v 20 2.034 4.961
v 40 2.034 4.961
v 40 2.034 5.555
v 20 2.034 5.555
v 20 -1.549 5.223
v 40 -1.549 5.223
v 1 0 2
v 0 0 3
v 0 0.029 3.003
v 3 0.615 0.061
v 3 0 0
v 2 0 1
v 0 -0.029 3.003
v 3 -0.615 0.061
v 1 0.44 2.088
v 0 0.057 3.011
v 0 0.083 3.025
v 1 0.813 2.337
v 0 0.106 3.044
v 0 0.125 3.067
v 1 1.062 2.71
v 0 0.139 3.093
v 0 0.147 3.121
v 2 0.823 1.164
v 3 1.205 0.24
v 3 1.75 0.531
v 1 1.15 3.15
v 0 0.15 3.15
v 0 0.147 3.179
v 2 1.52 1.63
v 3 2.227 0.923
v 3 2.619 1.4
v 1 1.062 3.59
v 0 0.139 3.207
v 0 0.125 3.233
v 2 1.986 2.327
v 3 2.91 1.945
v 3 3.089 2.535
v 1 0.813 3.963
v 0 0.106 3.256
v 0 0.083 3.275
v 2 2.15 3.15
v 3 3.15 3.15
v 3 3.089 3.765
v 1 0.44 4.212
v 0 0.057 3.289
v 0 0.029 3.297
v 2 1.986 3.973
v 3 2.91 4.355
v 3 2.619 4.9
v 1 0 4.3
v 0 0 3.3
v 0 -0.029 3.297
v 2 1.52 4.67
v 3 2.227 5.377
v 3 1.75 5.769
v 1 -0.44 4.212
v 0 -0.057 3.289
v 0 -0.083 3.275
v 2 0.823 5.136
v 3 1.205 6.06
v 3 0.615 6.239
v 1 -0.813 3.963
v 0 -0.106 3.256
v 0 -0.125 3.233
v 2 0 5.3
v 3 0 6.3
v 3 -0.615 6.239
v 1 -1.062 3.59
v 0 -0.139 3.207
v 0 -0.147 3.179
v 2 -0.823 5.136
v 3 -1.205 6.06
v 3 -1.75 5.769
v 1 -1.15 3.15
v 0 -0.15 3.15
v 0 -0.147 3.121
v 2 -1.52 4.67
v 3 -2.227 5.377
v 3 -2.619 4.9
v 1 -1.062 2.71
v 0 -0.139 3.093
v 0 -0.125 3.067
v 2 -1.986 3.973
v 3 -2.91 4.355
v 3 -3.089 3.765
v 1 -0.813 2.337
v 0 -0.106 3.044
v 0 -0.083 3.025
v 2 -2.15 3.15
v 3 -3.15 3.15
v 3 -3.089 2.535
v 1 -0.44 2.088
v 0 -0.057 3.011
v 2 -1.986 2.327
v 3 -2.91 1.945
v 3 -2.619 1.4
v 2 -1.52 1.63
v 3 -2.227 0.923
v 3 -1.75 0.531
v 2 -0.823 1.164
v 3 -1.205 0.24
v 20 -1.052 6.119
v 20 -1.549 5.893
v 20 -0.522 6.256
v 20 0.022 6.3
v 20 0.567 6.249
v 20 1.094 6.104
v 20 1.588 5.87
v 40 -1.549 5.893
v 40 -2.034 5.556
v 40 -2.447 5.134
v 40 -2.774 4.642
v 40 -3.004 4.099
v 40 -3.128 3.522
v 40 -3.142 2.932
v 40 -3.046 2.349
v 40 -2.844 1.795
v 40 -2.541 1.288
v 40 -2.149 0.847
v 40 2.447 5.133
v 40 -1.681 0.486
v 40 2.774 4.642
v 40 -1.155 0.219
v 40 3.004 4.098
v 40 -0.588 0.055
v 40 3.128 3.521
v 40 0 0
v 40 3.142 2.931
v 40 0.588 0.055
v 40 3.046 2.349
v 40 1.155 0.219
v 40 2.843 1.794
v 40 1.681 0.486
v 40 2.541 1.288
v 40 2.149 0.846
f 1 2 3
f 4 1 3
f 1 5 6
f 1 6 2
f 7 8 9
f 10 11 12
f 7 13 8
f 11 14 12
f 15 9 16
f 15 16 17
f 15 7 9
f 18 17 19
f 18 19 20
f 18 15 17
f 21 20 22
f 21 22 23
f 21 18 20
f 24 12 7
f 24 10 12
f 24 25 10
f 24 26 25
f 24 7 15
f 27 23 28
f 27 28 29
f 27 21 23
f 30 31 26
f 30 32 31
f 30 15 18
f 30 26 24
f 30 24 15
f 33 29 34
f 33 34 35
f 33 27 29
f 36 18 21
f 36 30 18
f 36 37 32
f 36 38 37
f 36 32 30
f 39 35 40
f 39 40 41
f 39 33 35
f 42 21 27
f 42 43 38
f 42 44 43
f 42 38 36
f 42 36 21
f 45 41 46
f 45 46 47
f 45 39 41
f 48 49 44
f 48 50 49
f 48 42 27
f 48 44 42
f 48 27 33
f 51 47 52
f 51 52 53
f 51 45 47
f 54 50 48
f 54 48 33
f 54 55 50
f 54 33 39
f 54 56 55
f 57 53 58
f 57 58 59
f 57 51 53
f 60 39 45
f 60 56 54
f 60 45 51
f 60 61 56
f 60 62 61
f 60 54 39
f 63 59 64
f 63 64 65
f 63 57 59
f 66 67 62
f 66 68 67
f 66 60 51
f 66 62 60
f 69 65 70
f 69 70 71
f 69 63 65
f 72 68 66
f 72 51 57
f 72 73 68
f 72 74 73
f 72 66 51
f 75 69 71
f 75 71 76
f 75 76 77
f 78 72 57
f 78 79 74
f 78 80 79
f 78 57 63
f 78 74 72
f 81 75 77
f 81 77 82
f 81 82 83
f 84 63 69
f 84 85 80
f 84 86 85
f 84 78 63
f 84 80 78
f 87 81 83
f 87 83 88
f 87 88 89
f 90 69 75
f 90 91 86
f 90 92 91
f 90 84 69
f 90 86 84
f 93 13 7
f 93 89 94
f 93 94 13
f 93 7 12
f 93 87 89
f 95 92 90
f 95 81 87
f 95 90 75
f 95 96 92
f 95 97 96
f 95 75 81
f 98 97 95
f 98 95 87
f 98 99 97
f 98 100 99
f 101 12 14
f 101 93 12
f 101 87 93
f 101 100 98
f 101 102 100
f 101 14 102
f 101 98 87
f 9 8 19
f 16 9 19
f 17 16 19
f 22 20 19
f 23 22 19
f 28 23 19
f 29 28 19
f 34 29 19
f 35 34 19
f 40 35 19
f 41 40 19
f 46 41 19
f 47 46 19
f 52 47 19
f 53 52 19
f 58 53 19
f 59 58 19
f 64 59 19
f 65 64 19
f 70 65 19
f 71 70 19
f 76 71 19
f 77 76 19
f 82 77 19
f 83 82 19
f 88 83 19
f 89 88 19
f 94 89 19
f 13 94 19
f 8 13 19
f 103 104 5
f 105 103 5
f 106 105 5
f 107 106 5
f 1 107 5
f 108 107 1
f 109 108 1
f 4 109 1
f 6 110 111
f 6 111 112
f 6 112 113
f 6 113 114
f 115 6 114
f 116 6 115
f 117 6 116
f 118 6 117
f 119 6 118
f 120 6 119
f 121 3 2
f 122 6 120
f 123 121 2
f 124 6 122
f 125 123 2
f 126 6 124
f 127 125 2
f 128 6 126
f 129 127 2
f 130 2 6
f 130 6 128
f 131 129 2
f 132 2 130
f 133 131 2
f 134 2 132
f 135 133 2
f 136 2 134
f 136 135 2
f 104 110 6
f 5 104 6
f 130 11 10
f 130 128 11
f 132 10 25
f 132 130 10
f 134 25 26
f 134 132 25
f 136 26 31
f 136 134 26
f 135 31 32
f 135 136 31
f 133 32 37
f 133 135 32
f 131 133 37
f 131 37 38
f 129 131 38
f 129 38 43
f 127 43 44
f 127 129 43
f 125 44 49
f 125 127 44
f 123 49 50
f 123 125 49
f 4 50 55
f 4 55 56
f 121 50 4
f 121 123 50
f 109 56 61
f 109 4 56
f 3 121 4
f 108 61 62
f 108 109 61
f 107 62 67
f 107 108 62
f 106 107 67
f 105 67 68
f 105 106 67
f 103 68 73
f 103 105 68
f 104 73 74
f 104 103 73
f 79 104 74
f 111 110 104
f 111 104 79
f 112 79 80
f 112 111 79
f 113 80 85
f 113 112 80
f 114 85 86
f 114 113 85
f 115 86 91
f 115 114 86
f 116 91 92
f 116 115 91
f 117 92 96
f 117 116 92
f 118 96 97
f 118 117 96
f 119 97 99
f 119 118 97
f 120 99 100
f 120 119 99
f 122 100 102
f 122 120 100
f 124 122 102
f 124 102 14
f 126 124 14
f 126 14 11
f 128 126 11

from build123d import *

# Parameters (mm, degrees)
F0_W     = 40
F0_H     = 3.15
F2_SIZE  = 3
F4_DEPTH = 20


with BuildPart() as f1:
    # F0 (on Front) → F1 (revolve)
    with BuildSketch(Plane.XZ):
        with Locations((20, 1.575)):
            Rectangle(F0_W, F0_H)
    revolve(axis=Axis((20, 0, 3.15), (1, 0, 0)))

    # F2
    f2_edges = [f1.edges().sort_by_distance(p)[0] for p in [
        (0, 0, 6.3),
    ]]
    chamfer(f2_edges, length=F2_SIZE)

    # F3 (on face) → F4 (cut)
    with BuildSketch(Plane.YZ.offset(40)):
        Polygon((2.034494, 6.619173), (-1.549196, 6.880851), (-1.549196, 5.222723), (2.034494, 4.961044), align=None)
    extrude(amount=-F4_DEPTH, mode=Mode.SUBTRACT)


solid = f1.part
